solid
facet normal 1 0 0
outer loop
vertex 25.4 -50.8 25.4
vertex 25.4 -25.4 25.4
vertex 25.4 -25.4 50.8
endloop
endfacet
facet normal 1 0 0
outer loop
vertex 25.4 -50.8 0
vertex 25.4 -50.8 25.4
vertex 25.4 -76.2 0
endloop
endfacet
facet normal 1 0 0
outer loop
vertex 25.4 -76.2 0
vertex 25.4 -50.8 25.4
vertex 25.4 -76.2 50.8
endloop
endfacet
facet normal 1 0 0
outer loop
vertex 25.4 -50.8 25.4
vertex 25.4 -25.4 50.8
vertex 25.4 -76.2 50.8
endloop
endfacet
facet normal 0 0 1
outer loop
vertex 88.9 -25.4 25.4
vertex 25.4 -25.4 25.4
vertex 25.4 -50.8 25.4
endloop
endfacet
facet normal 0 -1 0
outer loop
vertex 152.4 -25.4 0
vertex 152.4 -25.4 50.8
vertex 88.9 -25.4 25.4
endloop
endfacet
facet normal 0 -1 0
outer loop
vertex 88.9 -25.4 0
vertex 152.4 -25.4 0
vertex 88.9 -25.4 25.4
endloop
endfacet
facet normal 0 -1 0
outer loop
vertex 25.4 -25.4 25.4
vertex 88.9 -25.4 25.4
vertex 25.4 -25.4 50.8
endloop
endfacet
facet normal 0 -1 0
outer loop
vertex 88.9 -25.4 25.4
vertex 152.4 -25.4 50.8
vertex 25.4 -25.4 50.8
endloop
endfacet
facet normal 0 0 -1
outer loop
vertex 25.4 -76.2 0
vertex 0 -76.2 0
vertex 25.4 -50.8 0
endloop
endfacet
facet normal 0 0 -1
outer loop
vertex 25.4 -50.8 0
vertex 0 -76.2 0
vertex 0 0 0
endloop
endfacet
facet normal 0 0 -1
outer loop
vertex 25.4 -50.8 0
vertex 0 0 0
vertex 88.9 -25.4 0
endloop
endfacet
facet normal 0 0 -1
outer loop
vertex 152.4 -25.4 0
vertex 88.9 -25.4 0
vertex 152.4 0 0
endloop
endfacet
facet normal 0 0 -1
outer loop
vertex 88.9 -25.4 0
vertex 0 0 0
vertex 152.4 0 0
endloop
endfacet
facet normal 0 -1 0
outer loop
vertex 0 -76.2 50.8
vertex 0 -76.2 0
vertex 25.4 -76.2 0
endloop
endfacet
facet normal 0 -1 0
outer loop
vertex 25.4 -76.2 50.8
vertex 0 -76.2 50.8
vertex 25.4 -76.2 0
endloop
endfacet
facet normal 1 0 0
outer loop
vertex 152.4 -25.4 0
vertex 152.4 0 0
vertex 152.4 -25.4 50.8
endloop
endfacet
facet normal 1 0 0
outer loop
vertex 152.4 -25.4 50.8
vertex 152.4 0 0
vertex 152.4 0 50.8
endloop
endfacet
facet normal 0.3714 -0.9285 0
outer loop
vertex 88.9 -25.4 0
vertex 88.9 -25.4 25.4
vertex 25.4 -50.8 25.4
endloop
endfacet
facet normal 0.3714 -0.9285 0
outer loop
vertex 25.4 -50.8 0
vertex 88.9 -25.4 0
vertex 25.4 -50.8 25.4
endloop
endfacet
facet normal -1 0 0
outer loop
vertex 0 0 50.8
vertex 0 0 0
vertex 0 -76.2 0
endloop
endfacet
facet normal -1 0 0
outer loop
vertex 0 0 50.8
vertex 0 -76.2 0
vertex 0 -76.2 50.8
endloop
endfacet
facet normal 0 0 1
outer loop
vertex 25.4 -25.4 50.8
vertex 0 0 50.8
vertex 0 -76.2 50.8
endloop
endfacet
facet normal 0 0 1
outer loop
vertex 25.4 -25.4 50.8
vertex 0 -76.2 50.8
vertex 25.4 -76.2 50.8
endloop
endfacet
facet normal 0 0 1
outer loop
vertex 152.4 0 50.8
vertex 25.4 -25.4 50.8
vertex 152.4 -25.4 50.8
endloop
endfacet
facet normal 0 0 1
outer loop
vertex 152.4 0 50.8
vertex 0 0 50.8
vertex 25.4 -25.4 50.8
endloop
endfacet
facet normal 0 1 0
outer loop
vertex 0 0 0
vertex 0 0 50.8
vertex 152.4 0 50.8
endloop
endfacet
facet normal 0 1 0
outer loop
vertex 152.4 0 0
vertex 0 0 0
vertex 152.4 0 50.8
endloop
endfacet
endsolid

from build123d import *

# Parameters (mm, degrees)
F0_W     = 152.4
F0_H     = 50.8
F1_DEPTH = 76.2
F3_DEPTH = 50.8
F4_DEPTH = 25.4


with BuildPart() as f1:
    # F0 (on Front) → F1 (new body)
    with BuildSketch(Plane.XZ):
        with Locations((76.2, 25.4)):
            Rectangle(F0_W, F0_H)
    extrude(amount=F1_DEPTH)

    # F2 (on face) → F3 (cut)
    with BuildSketch(Plane.XY.offset(50.8)):
        Polygon((25.4, -50.8), (25.4, -76.2), (152.4, -76.2), (152.4, -25.4), (88.9, -25.4), align=None)
    extrude(amount=-F3_DEPTH, mode=Mode.SUBTRACT)

    # F2 (on face) → F4 (cut)
    with BuildSketch(Plane.XY.offset(50.8)):
        Polygon((25.4, -25.4), (25.4, -50.8), (88.9, -25.4), align=None)
    extrude(amount=-F4_DEPTH, mode=Mode.SUBTRACT)


solid = f1.part
